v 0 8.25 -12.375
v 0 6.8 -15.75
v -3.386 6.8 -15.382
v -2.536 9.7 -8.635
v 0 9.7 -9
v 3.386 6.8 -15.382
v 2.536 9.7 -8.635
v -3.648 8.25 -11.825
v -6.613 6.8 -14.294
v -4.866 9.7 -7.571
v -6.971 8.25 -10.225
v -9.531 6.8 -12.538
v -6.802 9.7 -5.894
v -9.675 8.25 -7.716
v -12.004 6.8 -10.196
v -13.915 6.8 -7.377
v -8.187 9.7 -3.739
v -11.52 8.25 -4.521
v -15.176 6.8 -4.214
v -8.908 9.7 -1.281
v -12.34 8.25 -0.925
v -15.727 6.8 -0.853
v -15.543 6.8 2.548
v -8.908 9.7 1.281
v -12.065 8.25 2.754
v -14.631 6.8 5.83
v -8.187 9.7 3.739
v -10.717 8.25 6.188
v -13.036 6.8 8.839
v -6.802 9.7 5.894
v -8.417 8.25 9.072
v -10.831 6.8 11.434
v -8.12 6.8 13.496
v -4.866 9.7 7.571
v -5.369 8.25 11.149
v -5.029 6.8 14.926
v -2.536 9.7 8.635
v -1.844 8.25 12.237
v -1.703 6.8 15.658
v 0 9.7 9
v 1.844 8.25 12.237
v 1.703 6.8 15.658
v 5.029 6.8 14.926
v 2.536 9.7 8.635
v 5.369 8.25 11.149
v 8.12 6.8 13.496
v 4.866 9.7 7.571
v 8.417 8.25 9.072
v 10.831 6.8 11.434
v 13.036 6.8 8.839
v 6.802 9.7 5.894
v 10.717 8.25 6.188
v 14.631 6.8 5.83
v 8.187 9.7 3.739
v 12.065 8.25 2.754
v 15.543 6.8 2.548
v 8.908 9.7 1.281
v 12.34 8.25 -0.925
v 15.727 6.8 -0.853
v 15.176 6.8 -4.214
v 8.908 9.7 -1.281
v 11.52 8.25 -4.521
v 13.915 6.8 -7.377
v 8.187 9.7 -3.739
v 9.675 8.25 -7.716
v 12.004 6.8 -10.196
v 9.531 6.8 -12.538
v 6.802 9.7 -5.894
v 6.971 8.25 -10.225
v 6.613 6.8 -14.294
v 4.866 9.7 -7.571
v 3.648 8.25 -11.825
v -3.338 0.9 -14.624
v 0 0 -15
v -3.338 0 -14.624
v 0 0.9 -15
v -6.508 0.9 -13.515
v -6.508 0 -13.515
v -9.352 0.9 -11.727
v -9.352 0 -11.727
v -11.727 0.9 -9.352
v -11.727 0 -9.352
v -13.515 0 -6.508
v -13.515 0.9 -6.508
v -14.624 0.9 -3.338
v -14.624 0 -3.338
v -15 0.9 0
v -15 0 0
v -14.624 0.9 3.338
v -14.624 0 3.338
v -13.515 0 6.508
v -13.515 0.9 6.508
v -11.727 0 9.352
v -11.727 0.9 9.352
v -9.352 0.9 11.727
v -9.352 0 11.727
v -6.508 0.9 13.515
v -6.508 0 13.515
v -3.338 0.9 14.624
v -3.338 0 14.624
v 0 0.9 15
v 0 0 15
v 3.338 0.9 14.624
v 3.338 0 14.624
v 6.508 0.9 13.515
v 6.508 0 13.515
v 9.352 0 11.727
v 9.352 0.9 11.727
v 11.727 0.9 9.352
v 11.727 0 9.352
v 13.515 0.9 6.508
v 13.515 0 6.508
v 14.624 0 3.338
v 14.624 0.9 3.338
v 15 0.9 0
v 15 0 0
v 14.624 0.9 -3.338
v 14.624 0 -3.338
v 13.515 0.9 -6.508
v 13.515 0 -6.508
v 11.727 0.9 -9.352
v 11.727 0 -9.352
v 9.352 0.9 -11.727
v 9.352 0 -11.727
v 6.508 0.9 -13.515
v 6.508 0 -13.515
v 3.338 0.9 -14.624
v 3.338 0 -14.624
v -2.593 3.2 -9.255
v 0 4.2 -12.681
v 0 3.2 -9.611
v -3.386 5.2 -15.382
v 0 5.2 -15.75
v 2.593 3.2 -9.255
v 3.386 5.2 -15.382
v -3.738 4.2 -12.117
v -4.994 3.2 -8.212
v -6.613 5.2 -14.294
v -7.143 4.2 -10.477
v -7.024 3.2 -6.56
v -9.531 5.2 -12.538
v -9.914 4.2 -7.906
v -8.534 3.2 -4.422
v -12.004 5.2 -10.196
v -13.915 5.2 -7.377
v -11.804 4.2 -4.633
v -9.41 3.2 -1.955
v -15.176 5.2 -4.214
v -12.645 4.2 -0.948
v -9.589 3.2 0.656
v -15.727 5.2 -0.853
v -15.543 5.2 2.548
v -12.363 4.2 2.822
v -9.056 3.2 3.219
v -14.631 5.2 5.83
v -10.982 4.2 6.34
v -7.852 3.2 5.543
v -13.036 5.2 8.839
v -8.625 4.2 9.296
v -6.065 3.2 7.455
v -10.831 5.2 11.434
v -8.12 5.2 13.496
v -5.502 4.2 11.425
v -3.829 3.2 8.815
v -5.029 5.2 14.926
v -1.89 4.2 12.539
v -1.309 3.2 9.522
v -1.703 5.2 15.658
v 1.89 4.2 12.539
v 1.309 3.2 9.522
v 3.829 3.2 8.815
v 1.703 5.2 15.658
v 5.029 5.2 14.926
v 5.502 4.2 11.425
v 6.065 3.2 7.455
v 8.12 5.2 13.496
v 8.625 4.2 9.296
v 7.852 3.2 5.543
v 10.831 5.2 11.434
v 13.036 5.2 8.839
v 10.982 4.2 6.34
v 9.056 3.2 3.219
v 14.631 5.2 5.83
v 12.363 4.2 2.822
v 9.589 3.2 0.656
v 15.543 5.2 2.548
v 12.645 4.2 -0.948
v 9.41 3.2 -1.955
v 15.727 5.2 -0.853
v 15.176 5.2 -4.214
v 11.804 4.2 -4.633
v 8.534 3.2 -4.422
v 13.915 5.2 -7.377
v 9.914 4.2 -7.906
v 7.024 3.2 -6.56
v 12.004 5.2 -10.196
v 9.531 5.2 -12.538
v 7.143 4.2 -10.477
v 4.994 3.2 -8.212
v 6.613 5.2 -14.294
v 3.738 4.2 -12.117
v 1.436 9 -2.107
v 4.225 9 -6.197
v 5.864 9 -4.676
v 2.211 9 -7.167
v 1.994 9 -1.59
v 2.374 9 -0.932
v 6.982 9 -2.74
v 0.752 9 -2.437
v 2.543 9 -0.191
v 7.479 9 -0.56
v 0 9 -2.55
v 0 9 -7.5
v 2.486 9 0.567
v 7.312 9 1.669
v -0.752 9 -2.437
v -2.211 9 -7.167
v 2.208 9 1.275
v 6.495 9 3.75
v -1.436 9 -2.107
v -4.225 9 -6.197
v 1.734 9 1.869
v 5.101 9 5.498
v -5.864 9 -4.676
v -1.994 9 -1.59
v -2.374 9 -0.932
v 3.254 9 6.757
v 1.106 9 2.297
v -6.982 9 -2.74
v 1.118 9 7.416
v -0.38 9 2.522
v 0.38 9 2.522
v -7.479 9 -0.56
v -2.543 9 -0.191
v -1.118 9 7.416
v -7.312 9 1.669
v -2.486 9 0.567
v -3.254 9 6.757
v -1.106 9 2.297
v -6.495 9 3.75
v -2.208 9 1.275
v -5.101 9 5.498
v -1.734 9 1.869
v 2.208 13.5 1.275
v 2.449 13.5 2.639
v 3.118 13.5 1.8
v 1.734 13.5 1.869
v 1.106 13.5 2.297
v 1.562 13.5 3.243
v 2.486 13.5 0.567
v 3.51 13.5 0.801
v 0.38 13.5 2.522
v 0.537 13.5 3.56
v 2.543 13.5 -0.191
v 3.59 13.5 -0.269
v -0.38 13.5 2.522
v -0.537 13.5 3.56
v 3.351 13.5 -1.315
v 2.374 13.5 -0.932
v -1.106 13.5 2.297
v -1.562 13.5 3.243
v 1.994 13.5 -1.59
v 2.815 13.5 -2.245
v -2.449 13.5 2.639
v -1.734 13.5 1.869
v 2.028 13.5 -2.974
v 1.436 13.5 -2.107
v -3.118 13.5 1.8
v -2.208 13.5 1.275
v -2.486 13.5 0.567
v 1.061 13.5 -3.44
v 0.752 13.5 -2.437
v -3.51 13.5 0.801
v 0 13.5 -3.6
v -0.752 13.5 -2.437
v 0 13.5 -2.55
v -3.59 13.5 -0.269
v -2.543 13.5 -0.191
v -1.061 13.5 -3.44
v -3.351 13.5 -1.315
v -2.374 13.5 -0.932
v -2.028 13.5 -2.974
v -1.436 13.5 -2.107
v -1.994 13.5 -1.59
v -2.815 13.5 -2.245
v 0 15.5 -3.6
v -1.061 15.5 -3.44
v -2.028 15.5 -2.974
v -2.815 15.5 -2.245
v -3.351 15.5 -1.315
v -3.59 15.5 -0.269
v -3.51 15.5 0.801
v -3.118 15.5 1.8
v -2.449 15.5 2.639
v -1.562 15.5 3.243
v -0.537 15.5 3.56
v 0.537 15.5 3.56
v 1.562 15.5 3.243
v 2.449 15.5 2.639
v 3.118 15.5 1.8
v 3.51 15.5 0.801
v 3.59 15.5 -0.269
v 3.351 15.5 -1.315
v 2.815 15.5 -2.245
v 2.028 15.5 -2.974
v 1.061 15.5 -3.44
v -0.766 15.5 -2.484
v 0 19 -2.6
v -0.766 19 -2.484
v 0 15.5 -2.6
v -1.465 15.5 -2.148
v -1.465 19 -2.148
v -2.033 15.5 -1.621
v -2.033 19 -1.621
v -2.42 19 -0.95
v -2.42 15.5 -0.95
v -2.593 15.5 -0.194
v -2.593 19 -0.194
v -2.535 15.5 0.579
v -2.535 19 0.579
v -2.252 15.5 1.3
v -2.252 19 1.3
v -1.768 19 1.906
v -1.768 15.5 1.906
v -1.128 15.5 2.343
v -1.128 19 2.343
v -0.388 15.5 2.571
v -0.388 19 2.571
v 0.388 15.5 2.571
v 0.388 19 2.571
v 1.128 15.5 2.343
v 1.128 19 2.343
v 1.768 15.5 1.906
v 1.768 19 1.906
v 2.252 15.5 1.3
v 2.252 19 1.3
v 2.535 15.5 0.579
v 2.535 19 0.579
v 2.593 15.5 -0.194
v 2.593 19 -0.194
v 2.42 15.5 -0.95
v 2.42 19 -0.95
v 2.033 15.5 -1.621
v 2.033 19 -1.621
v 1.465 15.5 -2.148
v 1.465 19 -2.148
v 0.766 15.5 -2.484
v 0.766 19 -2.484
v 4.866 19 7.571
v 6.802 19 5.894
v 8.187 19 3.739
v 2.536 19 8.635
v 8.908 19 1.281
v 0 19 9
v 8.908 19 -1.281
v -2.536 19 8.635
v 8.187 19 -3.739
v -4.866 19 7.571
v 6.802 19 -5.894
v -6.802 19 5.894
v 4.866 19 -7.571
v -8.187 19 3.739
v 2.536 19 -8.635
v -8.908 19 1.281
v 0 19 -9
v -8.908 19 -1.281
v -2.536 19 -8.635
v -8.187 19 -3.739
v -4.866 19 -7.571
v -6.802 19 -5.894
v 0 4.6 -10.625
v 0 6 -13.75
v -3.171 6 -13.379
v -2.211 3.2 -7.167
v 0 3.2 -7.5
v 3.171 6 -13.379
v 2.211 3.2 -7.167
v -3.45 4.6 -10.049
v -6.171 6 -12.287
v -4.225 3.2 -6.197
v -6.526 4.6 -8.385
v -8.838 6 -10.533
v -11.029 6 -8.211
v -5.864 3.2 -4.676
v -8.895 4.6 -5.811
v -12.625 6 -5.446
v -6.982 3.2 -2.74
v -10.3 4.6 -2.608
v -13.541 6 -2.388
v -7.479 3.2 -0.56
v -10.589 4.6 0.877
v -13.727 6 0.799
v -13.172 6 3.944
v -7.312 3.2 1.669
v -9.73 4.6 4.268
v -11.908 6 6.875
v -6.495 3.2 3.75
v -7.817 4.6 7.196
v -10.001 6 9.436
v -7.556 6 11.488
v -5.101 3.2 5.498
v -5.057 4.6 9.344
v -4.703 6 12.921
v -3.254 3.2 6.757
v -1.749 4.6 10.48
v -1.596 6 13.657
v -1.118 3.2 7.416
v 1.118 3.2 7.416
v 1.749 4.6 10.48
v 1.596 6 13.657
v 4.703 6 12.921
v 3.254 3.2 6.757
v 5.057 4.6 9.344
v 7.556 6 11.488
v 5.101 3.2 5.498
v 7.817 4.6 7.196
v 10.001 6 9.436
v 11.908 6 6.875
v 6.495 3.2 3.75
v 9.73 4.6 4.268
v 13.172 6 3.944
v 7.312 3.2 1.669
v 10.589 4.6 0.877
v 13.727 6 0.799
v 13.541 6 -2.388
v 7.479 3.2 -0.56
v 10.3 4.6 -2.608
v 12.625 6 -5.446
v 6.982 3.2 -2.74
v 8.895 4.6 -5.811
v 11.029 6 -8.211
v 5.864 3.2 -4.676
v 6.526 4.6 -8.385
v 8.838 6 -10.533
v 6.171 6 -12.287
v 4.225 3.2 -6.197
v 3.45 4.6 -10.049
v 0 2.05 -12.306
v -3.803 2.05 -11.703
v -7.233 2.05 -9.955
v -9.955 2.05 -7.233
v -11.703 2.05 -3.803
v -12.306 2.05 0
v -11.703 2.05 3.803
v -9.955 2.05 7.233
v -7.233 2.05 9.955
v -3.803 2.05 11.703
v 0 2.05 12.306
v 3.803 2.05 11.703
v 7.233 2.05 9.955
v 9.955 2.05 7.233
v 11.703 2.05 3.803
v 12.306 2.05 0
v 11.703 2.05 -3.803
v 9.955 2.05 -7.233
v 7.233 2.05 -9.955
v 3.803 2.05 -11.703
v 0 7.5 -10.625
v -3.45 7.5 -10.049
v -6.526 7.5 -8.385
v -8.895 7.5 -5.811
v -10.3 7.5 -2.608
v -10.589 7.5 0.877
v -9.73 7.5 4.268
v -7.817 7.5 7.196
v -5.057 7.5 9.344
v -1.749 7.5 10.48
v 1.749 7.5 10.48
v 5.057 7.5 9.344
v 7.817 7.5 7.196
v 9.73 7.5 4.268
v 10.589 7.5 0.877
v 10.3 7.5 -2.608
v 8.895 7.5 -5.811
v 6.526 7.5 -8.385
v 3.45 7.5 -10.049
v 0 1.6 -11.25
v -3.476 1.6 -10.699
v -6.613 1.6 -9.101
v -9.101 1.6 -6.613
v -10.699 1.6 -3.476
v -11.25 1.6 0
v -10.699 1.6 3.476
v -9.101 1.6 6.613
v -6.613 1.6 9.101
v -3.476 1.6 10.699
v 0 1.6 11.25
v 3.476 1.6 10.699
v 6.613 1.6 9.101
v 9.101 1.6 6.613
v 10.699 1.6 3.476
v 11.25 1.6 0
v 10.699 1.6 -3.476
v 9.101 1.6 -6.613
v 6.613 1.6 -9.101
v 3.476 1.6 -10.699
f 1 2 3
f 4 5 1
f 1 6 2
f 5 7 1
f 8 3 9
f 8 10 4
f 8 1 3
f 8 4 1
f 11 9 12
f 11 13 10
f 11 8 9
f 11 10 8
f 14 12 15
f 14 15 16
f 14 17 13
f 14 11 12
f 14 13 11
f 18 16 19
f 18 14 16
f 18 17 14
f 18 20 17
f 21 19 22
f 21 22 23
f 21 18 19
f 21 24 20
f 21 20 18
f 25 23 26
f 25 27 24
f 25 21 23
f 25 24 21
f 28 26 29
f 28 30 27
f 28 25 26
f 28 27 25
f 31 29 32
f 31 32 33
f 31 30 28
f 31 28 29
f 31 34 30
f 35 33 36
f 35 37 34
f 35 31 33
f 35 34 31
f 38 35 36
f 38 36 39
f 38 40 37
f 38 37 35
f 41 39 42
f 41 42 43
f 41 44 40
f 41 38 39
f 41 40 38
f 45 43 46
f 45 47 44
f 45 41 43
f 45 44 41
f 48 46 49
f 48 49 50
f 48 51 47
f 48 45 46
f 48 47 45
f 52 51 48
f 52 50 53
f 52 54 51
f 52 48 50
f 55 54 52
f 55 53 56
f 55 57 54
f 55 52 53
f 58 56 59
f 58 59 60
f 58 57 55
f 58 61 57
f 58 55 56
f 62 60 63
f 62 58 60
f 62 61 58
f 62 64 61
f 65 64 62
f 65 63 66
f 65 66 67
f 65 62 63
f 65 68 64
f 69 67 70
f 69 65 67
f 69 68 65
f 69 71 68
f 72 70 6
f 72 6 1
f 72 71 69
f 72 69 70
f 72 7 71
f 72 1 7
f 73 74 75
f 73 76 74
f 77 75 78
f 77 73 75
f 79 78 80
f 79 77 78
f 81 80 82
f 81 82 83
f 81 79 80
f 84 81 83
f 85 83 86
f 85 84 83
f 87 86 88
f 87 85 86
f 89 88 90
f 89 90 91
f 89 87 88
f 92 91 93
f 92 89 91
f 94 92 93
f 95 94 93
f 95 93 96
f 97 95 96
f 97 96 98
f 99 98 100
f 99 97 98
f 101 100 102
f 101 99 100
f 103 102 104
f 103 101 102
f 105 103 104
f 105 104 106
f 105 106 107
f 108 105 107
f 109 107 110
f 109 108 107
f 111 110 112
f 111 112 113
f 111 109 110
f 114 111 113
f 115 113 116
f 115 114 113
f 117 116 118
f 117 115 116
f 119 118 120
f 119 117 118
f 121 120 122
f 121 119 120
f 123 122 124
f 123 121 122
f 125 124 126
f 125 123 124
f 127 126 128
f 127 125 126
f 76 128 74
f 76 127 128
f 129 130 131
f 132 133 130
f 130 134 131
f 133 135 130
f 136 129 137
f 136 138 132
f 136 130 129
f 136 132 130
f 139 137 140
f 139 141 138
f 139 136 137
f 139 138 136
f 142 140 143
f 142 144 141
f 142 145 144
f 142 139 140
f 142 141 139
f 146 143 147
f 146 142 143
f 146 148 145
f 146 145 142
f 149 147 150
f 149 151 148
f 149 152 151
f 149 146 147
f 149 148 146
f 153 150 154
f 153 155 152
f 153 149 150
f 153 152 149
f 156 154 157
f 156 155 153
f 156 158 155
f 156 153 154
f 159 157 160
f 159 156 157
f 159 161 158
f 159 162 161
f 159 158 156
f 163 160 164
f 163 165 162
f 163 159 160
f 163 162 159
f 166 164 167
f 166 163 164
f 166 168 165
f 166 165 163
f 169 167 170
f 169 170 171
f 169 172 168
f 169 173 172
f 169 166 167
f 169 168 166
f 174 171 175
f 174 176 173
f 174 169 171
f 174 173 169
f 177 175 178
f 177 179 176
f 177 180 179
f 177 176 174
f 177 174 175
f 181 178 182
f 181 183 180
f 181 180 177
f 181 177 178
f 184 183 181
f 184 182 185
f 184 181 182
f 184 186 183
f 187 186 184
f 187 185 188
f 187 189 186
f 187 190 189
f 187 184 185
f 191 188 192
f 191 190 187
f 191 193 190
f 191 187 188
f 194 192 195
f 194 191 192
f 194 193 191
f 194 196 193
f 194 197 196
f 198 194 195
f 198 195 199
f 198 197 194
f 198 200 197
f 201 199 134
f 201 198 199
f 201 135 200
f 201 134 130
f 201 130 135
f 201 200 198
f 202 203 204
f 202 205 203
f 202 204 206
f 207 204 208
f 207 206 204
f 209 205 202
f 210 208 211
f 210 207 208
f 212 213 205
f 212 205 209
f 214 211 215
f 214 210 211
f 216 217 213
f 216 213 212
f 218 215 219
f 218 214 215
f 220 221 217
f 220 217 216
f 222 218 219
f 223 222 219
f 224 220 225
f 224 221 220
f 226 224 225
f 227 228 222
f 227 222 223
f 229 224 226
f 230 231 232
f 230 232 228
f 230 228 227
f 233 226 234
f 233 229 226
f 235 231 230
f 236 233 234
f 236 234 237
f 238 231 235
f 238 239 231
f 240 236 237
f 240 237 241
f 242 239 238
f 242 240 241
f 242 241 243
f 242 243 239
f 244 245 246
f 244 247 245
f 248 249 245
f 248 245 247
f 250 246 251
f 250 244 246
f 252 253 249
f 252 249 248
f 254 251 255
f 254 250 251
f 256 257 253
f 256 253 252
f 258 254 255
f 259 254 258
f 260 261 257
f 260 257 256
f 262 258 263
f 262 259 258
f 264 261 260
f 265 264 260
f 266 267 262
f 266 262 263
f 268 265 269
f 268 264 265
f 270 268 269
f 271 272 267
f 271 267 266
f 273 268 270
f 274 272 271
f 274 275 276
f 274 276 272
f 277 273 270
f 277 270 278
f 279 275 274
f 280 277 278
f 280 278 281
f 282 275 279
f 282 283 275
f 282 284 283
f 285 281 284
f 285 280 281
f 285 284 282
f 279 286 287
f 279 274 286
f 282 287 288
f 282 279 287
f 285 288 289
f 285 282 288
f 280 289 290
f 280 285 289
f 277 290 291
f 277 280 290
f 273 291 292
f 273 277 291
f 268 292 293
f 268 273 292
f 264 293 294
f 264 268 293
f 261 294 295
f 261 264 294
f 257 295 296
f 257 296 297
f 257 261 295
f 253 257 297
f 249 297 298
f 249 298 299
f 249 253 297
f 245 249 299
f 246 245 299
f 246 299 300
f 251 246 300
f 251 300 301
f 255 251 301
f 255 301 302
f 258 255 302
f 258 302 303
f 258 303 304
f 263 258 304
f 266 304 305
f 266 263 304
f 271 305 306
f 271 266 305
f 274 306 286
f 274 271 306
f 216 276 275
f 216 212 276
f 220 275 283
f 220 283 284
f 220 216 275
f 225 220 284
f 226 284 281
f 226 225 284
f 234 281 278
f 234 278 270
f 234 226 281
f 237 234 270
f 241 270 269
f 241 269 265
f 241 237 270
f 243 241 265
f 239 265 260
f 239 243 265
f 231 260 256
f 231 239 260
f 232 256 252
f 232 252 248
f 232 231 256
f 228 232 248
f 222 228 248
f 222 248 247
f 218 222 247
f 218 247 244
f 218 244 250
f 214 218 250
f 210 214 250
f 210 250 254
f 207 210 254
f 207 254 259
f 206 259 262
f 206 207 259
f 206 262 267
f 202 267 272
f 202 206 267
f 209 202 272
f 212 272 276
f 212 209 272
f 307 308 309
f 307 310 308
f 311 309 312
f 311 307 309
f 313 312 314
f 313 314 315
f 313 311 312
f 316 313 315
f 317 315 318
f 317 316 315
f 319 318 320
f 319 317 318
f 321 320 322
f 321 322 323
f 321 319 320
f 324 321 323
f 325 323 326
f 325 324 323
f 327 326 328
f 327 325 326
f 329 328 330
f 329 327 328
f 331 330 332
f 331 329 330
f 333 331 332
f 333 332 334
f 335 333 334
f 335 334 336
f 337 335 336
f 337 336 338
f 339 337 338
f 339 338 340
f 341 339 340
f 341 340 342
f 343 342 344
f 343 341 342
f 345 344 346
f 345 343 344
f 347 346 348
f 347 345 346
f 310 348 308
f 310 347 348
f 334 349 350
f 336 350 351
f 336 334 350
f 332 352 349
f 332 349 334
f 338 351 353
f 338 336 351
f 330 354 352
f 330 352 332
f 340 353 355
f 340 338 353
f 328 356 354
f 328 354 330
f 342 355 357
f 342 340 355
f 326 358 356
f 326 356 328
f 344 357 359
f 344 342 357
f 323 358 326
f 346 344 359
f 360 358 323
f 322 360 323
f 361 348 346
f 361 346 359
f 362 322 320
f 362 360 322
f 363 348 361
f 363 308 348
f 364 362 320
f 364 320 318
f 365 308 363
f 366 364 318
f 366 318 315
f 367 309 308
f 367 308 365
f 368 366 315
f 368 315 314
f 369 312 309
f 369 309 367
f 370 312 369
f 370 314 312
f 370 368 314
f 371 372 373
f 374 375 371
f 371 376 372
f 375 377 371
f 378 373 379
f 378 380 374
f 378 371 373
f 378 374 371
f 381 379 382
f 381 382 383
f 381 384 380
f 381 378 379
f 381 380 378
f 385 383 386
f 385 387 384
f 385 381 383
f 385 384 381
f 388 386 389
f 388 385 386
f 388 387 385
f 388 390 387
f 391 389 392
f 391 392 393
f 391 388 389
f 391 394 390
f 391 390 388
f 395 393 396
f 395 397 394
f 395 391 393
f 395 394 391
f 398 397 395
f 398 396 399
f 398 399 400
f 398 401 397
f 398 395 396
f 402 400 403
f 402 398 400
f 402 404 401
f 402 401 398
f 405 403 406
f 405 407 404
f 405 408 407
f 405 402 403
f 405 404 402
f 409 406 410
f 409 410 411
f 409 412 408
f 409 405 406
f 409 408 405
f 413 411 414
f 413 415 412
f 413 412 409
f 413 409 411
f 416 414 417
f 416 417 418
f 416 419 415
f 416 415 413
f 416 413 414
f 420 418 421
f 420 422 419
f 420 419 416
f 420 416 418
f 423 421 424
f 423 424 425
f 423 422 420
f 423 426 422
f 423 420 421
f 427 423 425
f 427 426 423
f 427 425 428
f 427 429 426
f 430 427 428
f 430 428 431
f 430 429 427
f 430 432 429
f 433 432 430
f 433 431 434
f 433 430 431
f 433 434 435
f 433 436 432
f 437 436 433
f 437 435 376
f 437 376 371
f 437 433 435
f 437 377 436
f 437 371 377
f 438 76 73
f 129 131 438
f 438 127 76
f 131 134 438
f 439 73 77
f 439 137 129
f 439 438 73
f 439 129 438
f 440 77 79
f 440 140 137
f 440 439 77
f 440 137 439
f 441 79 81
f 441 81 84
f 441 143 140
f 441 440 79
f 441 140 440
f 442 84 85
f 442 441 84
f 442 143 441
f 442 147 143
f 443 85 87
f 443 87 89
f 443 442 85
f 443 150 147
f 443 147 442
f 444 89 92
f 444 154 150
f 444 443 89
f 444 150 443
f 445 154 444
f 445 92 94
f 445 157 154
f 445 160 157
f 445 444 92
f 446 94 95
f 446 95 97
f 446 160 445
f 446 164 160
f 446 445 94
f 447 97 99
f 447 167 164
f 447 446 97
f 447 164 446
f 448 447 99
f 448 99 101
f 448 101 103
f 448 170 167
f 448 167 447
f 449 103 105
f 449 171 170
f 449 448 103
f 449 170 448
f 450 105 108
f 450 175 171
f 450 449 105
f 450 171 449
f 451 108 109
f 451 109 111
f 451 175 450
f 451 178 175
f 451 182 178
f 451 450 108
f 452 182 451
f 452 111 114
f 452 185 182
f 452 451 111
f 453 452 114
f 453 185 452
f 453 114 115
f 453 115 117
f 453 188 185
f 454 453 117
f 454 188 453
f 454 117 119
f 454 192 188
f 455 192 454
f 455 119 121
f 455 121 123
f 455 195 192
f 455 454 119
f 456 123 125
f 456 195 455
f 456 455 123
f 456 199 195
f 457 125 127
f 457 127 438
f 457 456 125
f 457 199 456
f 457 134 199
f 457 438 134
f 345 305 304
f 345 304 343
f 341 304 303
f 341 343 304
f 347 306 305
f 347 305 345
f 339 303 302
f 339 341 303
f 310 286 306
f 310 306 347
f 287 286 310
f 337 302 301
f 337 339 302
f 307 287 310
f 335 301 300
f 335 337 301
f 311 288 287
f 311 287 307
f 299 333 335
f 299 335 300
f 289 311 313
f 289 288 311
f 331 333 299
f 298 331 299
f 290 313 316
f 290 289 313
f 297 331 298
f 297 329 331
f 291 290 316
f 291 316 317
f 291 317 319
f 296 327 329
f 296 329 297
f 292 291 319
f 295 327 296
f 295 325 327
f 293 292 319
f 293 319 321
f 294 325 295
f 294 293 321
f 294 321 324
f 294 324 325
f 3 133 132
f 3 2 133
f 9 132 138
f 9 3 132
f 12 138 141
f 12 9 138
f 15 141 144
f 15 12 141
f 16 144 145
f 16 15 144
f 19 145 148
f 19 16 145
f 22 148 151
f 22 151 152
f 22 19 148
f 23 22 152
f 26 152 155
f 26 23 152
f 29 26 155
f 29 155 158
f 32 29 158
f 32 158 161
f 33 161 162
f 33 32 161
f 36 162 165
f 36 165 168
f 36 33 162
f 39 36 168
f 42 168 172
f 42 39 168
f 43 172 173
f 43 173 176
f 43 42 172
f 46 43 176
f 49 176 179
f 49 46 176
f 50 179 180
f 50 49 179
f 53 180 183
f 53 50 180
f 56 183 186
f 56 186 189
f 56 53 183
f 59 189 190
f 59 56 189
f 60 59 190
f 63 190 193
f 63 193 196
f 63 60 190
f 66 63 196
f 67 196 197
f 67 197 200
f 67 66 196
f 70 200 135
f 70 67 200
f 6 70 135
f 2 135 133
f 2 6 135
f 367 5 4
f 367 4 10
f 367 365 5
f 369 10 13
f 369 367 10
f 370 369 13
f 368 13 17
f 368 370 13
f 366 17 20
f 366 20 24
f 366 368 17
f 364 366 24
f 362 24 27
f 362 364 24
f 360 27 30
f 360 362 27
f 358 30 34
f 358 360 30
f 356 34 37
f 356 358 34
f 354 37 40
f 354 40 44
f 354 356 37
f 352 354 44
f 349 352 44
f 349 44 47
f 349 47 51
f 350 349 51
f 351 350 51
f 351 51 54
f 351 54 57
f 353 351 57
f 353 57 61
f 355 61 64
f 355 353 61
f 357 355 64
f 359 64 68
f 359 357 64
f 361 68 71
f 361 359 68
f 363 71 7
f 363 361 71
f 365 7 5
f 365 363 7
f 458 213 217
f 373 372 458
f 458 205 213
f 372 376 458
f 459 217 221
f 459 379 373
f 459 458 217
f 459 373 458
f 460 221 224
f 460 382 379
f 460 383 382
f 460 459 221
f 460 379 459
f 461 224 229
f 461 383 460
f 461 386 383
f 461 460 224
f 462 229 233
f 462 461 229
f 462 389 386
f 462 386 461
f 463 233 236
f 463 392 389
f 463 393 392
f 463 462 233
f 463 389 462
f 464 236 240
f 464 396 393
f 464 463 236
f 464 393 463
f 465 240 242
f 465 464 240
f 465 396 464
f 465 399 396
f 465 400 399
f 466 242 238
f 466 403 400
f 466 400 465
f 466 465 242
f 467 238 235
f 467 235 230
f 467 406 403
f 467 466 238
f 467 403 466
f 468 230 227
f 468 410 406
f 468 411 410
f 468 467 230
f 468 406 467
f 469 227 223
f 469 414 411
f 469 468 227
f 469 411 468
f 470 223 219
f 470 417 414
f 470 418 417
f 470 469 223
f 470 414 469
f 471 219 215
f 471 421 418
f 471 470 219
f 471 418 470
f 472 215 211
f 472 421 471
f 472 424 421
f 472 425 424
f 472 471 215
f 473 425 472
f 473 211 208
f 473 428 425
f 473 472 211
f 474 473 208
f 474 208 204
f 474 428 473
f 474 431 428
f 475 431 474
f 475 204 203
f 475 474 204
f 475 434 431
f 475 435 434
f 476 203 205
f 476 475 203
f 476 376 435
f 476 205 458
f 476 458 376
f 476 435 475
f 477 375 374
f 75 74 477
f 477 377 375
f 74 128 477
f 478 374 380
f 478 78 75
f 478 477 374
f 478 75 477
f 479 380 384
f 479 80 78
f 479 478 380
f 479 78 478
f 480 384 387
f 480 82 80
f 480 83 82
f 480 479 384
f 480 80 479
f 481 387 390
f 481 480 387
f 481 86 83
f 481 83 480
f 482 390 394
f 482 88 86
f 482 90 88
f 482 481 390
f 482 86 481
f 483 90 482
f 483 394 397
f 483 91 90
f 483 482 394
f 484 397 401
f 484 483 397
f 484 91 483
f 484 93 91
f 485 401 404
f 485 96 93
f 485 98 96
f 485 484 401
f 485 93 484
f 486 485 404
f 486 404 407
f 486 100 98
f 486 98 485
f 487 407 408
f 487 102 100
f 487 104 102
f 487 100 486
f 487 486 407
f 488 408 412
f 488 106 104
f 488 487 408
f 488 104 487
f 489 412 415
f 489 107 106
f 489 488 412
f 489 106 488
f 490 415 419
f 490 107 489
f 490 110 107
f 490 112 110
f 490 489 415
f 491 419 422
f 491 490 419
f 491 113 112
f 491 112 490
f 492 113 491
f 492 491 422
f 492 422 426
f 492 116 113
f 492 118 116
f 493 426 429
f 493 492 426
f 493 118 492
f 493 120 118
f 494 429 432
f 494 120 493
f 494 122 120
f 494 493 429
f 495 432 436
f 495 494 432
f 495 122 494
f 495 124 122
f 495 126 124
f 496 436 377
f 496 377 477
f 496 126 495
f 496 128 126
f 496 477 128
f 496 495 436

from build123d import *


with BuildPart() as part:
    # Esquisse1 → Révolution1 (revolve)
    with BuildSketch(Plane(origin=(0, 0, 0), x_dir=(0, 0, -1), z_dir=(1, 0, 0)), mode=Mode.PRIVATE) as r_volution1_sk:
        Polygon((-2.6, 19), (-2.6, 15.5), (-3.6, 15.5), (-3.6, 13.5), (-2.55, 13.5), (-2.55, 9), (-7.5, 9), (-13.75, 6), (-7.5, 3.2), (-15, 0), (-15, 0.9), (-9.611144406, 3.2), (-15.75, 5.2), (-15.75, 6.8), (-9, 9.7), (-9, 19), align=None)
    revolve(r_volution1_sk.sketch.rotate(Axis((0, 0, 0), (0, 1, 0)), 180), axis=Axis((0, 0, 0), (0, 1, 0)))


solid = part.part
